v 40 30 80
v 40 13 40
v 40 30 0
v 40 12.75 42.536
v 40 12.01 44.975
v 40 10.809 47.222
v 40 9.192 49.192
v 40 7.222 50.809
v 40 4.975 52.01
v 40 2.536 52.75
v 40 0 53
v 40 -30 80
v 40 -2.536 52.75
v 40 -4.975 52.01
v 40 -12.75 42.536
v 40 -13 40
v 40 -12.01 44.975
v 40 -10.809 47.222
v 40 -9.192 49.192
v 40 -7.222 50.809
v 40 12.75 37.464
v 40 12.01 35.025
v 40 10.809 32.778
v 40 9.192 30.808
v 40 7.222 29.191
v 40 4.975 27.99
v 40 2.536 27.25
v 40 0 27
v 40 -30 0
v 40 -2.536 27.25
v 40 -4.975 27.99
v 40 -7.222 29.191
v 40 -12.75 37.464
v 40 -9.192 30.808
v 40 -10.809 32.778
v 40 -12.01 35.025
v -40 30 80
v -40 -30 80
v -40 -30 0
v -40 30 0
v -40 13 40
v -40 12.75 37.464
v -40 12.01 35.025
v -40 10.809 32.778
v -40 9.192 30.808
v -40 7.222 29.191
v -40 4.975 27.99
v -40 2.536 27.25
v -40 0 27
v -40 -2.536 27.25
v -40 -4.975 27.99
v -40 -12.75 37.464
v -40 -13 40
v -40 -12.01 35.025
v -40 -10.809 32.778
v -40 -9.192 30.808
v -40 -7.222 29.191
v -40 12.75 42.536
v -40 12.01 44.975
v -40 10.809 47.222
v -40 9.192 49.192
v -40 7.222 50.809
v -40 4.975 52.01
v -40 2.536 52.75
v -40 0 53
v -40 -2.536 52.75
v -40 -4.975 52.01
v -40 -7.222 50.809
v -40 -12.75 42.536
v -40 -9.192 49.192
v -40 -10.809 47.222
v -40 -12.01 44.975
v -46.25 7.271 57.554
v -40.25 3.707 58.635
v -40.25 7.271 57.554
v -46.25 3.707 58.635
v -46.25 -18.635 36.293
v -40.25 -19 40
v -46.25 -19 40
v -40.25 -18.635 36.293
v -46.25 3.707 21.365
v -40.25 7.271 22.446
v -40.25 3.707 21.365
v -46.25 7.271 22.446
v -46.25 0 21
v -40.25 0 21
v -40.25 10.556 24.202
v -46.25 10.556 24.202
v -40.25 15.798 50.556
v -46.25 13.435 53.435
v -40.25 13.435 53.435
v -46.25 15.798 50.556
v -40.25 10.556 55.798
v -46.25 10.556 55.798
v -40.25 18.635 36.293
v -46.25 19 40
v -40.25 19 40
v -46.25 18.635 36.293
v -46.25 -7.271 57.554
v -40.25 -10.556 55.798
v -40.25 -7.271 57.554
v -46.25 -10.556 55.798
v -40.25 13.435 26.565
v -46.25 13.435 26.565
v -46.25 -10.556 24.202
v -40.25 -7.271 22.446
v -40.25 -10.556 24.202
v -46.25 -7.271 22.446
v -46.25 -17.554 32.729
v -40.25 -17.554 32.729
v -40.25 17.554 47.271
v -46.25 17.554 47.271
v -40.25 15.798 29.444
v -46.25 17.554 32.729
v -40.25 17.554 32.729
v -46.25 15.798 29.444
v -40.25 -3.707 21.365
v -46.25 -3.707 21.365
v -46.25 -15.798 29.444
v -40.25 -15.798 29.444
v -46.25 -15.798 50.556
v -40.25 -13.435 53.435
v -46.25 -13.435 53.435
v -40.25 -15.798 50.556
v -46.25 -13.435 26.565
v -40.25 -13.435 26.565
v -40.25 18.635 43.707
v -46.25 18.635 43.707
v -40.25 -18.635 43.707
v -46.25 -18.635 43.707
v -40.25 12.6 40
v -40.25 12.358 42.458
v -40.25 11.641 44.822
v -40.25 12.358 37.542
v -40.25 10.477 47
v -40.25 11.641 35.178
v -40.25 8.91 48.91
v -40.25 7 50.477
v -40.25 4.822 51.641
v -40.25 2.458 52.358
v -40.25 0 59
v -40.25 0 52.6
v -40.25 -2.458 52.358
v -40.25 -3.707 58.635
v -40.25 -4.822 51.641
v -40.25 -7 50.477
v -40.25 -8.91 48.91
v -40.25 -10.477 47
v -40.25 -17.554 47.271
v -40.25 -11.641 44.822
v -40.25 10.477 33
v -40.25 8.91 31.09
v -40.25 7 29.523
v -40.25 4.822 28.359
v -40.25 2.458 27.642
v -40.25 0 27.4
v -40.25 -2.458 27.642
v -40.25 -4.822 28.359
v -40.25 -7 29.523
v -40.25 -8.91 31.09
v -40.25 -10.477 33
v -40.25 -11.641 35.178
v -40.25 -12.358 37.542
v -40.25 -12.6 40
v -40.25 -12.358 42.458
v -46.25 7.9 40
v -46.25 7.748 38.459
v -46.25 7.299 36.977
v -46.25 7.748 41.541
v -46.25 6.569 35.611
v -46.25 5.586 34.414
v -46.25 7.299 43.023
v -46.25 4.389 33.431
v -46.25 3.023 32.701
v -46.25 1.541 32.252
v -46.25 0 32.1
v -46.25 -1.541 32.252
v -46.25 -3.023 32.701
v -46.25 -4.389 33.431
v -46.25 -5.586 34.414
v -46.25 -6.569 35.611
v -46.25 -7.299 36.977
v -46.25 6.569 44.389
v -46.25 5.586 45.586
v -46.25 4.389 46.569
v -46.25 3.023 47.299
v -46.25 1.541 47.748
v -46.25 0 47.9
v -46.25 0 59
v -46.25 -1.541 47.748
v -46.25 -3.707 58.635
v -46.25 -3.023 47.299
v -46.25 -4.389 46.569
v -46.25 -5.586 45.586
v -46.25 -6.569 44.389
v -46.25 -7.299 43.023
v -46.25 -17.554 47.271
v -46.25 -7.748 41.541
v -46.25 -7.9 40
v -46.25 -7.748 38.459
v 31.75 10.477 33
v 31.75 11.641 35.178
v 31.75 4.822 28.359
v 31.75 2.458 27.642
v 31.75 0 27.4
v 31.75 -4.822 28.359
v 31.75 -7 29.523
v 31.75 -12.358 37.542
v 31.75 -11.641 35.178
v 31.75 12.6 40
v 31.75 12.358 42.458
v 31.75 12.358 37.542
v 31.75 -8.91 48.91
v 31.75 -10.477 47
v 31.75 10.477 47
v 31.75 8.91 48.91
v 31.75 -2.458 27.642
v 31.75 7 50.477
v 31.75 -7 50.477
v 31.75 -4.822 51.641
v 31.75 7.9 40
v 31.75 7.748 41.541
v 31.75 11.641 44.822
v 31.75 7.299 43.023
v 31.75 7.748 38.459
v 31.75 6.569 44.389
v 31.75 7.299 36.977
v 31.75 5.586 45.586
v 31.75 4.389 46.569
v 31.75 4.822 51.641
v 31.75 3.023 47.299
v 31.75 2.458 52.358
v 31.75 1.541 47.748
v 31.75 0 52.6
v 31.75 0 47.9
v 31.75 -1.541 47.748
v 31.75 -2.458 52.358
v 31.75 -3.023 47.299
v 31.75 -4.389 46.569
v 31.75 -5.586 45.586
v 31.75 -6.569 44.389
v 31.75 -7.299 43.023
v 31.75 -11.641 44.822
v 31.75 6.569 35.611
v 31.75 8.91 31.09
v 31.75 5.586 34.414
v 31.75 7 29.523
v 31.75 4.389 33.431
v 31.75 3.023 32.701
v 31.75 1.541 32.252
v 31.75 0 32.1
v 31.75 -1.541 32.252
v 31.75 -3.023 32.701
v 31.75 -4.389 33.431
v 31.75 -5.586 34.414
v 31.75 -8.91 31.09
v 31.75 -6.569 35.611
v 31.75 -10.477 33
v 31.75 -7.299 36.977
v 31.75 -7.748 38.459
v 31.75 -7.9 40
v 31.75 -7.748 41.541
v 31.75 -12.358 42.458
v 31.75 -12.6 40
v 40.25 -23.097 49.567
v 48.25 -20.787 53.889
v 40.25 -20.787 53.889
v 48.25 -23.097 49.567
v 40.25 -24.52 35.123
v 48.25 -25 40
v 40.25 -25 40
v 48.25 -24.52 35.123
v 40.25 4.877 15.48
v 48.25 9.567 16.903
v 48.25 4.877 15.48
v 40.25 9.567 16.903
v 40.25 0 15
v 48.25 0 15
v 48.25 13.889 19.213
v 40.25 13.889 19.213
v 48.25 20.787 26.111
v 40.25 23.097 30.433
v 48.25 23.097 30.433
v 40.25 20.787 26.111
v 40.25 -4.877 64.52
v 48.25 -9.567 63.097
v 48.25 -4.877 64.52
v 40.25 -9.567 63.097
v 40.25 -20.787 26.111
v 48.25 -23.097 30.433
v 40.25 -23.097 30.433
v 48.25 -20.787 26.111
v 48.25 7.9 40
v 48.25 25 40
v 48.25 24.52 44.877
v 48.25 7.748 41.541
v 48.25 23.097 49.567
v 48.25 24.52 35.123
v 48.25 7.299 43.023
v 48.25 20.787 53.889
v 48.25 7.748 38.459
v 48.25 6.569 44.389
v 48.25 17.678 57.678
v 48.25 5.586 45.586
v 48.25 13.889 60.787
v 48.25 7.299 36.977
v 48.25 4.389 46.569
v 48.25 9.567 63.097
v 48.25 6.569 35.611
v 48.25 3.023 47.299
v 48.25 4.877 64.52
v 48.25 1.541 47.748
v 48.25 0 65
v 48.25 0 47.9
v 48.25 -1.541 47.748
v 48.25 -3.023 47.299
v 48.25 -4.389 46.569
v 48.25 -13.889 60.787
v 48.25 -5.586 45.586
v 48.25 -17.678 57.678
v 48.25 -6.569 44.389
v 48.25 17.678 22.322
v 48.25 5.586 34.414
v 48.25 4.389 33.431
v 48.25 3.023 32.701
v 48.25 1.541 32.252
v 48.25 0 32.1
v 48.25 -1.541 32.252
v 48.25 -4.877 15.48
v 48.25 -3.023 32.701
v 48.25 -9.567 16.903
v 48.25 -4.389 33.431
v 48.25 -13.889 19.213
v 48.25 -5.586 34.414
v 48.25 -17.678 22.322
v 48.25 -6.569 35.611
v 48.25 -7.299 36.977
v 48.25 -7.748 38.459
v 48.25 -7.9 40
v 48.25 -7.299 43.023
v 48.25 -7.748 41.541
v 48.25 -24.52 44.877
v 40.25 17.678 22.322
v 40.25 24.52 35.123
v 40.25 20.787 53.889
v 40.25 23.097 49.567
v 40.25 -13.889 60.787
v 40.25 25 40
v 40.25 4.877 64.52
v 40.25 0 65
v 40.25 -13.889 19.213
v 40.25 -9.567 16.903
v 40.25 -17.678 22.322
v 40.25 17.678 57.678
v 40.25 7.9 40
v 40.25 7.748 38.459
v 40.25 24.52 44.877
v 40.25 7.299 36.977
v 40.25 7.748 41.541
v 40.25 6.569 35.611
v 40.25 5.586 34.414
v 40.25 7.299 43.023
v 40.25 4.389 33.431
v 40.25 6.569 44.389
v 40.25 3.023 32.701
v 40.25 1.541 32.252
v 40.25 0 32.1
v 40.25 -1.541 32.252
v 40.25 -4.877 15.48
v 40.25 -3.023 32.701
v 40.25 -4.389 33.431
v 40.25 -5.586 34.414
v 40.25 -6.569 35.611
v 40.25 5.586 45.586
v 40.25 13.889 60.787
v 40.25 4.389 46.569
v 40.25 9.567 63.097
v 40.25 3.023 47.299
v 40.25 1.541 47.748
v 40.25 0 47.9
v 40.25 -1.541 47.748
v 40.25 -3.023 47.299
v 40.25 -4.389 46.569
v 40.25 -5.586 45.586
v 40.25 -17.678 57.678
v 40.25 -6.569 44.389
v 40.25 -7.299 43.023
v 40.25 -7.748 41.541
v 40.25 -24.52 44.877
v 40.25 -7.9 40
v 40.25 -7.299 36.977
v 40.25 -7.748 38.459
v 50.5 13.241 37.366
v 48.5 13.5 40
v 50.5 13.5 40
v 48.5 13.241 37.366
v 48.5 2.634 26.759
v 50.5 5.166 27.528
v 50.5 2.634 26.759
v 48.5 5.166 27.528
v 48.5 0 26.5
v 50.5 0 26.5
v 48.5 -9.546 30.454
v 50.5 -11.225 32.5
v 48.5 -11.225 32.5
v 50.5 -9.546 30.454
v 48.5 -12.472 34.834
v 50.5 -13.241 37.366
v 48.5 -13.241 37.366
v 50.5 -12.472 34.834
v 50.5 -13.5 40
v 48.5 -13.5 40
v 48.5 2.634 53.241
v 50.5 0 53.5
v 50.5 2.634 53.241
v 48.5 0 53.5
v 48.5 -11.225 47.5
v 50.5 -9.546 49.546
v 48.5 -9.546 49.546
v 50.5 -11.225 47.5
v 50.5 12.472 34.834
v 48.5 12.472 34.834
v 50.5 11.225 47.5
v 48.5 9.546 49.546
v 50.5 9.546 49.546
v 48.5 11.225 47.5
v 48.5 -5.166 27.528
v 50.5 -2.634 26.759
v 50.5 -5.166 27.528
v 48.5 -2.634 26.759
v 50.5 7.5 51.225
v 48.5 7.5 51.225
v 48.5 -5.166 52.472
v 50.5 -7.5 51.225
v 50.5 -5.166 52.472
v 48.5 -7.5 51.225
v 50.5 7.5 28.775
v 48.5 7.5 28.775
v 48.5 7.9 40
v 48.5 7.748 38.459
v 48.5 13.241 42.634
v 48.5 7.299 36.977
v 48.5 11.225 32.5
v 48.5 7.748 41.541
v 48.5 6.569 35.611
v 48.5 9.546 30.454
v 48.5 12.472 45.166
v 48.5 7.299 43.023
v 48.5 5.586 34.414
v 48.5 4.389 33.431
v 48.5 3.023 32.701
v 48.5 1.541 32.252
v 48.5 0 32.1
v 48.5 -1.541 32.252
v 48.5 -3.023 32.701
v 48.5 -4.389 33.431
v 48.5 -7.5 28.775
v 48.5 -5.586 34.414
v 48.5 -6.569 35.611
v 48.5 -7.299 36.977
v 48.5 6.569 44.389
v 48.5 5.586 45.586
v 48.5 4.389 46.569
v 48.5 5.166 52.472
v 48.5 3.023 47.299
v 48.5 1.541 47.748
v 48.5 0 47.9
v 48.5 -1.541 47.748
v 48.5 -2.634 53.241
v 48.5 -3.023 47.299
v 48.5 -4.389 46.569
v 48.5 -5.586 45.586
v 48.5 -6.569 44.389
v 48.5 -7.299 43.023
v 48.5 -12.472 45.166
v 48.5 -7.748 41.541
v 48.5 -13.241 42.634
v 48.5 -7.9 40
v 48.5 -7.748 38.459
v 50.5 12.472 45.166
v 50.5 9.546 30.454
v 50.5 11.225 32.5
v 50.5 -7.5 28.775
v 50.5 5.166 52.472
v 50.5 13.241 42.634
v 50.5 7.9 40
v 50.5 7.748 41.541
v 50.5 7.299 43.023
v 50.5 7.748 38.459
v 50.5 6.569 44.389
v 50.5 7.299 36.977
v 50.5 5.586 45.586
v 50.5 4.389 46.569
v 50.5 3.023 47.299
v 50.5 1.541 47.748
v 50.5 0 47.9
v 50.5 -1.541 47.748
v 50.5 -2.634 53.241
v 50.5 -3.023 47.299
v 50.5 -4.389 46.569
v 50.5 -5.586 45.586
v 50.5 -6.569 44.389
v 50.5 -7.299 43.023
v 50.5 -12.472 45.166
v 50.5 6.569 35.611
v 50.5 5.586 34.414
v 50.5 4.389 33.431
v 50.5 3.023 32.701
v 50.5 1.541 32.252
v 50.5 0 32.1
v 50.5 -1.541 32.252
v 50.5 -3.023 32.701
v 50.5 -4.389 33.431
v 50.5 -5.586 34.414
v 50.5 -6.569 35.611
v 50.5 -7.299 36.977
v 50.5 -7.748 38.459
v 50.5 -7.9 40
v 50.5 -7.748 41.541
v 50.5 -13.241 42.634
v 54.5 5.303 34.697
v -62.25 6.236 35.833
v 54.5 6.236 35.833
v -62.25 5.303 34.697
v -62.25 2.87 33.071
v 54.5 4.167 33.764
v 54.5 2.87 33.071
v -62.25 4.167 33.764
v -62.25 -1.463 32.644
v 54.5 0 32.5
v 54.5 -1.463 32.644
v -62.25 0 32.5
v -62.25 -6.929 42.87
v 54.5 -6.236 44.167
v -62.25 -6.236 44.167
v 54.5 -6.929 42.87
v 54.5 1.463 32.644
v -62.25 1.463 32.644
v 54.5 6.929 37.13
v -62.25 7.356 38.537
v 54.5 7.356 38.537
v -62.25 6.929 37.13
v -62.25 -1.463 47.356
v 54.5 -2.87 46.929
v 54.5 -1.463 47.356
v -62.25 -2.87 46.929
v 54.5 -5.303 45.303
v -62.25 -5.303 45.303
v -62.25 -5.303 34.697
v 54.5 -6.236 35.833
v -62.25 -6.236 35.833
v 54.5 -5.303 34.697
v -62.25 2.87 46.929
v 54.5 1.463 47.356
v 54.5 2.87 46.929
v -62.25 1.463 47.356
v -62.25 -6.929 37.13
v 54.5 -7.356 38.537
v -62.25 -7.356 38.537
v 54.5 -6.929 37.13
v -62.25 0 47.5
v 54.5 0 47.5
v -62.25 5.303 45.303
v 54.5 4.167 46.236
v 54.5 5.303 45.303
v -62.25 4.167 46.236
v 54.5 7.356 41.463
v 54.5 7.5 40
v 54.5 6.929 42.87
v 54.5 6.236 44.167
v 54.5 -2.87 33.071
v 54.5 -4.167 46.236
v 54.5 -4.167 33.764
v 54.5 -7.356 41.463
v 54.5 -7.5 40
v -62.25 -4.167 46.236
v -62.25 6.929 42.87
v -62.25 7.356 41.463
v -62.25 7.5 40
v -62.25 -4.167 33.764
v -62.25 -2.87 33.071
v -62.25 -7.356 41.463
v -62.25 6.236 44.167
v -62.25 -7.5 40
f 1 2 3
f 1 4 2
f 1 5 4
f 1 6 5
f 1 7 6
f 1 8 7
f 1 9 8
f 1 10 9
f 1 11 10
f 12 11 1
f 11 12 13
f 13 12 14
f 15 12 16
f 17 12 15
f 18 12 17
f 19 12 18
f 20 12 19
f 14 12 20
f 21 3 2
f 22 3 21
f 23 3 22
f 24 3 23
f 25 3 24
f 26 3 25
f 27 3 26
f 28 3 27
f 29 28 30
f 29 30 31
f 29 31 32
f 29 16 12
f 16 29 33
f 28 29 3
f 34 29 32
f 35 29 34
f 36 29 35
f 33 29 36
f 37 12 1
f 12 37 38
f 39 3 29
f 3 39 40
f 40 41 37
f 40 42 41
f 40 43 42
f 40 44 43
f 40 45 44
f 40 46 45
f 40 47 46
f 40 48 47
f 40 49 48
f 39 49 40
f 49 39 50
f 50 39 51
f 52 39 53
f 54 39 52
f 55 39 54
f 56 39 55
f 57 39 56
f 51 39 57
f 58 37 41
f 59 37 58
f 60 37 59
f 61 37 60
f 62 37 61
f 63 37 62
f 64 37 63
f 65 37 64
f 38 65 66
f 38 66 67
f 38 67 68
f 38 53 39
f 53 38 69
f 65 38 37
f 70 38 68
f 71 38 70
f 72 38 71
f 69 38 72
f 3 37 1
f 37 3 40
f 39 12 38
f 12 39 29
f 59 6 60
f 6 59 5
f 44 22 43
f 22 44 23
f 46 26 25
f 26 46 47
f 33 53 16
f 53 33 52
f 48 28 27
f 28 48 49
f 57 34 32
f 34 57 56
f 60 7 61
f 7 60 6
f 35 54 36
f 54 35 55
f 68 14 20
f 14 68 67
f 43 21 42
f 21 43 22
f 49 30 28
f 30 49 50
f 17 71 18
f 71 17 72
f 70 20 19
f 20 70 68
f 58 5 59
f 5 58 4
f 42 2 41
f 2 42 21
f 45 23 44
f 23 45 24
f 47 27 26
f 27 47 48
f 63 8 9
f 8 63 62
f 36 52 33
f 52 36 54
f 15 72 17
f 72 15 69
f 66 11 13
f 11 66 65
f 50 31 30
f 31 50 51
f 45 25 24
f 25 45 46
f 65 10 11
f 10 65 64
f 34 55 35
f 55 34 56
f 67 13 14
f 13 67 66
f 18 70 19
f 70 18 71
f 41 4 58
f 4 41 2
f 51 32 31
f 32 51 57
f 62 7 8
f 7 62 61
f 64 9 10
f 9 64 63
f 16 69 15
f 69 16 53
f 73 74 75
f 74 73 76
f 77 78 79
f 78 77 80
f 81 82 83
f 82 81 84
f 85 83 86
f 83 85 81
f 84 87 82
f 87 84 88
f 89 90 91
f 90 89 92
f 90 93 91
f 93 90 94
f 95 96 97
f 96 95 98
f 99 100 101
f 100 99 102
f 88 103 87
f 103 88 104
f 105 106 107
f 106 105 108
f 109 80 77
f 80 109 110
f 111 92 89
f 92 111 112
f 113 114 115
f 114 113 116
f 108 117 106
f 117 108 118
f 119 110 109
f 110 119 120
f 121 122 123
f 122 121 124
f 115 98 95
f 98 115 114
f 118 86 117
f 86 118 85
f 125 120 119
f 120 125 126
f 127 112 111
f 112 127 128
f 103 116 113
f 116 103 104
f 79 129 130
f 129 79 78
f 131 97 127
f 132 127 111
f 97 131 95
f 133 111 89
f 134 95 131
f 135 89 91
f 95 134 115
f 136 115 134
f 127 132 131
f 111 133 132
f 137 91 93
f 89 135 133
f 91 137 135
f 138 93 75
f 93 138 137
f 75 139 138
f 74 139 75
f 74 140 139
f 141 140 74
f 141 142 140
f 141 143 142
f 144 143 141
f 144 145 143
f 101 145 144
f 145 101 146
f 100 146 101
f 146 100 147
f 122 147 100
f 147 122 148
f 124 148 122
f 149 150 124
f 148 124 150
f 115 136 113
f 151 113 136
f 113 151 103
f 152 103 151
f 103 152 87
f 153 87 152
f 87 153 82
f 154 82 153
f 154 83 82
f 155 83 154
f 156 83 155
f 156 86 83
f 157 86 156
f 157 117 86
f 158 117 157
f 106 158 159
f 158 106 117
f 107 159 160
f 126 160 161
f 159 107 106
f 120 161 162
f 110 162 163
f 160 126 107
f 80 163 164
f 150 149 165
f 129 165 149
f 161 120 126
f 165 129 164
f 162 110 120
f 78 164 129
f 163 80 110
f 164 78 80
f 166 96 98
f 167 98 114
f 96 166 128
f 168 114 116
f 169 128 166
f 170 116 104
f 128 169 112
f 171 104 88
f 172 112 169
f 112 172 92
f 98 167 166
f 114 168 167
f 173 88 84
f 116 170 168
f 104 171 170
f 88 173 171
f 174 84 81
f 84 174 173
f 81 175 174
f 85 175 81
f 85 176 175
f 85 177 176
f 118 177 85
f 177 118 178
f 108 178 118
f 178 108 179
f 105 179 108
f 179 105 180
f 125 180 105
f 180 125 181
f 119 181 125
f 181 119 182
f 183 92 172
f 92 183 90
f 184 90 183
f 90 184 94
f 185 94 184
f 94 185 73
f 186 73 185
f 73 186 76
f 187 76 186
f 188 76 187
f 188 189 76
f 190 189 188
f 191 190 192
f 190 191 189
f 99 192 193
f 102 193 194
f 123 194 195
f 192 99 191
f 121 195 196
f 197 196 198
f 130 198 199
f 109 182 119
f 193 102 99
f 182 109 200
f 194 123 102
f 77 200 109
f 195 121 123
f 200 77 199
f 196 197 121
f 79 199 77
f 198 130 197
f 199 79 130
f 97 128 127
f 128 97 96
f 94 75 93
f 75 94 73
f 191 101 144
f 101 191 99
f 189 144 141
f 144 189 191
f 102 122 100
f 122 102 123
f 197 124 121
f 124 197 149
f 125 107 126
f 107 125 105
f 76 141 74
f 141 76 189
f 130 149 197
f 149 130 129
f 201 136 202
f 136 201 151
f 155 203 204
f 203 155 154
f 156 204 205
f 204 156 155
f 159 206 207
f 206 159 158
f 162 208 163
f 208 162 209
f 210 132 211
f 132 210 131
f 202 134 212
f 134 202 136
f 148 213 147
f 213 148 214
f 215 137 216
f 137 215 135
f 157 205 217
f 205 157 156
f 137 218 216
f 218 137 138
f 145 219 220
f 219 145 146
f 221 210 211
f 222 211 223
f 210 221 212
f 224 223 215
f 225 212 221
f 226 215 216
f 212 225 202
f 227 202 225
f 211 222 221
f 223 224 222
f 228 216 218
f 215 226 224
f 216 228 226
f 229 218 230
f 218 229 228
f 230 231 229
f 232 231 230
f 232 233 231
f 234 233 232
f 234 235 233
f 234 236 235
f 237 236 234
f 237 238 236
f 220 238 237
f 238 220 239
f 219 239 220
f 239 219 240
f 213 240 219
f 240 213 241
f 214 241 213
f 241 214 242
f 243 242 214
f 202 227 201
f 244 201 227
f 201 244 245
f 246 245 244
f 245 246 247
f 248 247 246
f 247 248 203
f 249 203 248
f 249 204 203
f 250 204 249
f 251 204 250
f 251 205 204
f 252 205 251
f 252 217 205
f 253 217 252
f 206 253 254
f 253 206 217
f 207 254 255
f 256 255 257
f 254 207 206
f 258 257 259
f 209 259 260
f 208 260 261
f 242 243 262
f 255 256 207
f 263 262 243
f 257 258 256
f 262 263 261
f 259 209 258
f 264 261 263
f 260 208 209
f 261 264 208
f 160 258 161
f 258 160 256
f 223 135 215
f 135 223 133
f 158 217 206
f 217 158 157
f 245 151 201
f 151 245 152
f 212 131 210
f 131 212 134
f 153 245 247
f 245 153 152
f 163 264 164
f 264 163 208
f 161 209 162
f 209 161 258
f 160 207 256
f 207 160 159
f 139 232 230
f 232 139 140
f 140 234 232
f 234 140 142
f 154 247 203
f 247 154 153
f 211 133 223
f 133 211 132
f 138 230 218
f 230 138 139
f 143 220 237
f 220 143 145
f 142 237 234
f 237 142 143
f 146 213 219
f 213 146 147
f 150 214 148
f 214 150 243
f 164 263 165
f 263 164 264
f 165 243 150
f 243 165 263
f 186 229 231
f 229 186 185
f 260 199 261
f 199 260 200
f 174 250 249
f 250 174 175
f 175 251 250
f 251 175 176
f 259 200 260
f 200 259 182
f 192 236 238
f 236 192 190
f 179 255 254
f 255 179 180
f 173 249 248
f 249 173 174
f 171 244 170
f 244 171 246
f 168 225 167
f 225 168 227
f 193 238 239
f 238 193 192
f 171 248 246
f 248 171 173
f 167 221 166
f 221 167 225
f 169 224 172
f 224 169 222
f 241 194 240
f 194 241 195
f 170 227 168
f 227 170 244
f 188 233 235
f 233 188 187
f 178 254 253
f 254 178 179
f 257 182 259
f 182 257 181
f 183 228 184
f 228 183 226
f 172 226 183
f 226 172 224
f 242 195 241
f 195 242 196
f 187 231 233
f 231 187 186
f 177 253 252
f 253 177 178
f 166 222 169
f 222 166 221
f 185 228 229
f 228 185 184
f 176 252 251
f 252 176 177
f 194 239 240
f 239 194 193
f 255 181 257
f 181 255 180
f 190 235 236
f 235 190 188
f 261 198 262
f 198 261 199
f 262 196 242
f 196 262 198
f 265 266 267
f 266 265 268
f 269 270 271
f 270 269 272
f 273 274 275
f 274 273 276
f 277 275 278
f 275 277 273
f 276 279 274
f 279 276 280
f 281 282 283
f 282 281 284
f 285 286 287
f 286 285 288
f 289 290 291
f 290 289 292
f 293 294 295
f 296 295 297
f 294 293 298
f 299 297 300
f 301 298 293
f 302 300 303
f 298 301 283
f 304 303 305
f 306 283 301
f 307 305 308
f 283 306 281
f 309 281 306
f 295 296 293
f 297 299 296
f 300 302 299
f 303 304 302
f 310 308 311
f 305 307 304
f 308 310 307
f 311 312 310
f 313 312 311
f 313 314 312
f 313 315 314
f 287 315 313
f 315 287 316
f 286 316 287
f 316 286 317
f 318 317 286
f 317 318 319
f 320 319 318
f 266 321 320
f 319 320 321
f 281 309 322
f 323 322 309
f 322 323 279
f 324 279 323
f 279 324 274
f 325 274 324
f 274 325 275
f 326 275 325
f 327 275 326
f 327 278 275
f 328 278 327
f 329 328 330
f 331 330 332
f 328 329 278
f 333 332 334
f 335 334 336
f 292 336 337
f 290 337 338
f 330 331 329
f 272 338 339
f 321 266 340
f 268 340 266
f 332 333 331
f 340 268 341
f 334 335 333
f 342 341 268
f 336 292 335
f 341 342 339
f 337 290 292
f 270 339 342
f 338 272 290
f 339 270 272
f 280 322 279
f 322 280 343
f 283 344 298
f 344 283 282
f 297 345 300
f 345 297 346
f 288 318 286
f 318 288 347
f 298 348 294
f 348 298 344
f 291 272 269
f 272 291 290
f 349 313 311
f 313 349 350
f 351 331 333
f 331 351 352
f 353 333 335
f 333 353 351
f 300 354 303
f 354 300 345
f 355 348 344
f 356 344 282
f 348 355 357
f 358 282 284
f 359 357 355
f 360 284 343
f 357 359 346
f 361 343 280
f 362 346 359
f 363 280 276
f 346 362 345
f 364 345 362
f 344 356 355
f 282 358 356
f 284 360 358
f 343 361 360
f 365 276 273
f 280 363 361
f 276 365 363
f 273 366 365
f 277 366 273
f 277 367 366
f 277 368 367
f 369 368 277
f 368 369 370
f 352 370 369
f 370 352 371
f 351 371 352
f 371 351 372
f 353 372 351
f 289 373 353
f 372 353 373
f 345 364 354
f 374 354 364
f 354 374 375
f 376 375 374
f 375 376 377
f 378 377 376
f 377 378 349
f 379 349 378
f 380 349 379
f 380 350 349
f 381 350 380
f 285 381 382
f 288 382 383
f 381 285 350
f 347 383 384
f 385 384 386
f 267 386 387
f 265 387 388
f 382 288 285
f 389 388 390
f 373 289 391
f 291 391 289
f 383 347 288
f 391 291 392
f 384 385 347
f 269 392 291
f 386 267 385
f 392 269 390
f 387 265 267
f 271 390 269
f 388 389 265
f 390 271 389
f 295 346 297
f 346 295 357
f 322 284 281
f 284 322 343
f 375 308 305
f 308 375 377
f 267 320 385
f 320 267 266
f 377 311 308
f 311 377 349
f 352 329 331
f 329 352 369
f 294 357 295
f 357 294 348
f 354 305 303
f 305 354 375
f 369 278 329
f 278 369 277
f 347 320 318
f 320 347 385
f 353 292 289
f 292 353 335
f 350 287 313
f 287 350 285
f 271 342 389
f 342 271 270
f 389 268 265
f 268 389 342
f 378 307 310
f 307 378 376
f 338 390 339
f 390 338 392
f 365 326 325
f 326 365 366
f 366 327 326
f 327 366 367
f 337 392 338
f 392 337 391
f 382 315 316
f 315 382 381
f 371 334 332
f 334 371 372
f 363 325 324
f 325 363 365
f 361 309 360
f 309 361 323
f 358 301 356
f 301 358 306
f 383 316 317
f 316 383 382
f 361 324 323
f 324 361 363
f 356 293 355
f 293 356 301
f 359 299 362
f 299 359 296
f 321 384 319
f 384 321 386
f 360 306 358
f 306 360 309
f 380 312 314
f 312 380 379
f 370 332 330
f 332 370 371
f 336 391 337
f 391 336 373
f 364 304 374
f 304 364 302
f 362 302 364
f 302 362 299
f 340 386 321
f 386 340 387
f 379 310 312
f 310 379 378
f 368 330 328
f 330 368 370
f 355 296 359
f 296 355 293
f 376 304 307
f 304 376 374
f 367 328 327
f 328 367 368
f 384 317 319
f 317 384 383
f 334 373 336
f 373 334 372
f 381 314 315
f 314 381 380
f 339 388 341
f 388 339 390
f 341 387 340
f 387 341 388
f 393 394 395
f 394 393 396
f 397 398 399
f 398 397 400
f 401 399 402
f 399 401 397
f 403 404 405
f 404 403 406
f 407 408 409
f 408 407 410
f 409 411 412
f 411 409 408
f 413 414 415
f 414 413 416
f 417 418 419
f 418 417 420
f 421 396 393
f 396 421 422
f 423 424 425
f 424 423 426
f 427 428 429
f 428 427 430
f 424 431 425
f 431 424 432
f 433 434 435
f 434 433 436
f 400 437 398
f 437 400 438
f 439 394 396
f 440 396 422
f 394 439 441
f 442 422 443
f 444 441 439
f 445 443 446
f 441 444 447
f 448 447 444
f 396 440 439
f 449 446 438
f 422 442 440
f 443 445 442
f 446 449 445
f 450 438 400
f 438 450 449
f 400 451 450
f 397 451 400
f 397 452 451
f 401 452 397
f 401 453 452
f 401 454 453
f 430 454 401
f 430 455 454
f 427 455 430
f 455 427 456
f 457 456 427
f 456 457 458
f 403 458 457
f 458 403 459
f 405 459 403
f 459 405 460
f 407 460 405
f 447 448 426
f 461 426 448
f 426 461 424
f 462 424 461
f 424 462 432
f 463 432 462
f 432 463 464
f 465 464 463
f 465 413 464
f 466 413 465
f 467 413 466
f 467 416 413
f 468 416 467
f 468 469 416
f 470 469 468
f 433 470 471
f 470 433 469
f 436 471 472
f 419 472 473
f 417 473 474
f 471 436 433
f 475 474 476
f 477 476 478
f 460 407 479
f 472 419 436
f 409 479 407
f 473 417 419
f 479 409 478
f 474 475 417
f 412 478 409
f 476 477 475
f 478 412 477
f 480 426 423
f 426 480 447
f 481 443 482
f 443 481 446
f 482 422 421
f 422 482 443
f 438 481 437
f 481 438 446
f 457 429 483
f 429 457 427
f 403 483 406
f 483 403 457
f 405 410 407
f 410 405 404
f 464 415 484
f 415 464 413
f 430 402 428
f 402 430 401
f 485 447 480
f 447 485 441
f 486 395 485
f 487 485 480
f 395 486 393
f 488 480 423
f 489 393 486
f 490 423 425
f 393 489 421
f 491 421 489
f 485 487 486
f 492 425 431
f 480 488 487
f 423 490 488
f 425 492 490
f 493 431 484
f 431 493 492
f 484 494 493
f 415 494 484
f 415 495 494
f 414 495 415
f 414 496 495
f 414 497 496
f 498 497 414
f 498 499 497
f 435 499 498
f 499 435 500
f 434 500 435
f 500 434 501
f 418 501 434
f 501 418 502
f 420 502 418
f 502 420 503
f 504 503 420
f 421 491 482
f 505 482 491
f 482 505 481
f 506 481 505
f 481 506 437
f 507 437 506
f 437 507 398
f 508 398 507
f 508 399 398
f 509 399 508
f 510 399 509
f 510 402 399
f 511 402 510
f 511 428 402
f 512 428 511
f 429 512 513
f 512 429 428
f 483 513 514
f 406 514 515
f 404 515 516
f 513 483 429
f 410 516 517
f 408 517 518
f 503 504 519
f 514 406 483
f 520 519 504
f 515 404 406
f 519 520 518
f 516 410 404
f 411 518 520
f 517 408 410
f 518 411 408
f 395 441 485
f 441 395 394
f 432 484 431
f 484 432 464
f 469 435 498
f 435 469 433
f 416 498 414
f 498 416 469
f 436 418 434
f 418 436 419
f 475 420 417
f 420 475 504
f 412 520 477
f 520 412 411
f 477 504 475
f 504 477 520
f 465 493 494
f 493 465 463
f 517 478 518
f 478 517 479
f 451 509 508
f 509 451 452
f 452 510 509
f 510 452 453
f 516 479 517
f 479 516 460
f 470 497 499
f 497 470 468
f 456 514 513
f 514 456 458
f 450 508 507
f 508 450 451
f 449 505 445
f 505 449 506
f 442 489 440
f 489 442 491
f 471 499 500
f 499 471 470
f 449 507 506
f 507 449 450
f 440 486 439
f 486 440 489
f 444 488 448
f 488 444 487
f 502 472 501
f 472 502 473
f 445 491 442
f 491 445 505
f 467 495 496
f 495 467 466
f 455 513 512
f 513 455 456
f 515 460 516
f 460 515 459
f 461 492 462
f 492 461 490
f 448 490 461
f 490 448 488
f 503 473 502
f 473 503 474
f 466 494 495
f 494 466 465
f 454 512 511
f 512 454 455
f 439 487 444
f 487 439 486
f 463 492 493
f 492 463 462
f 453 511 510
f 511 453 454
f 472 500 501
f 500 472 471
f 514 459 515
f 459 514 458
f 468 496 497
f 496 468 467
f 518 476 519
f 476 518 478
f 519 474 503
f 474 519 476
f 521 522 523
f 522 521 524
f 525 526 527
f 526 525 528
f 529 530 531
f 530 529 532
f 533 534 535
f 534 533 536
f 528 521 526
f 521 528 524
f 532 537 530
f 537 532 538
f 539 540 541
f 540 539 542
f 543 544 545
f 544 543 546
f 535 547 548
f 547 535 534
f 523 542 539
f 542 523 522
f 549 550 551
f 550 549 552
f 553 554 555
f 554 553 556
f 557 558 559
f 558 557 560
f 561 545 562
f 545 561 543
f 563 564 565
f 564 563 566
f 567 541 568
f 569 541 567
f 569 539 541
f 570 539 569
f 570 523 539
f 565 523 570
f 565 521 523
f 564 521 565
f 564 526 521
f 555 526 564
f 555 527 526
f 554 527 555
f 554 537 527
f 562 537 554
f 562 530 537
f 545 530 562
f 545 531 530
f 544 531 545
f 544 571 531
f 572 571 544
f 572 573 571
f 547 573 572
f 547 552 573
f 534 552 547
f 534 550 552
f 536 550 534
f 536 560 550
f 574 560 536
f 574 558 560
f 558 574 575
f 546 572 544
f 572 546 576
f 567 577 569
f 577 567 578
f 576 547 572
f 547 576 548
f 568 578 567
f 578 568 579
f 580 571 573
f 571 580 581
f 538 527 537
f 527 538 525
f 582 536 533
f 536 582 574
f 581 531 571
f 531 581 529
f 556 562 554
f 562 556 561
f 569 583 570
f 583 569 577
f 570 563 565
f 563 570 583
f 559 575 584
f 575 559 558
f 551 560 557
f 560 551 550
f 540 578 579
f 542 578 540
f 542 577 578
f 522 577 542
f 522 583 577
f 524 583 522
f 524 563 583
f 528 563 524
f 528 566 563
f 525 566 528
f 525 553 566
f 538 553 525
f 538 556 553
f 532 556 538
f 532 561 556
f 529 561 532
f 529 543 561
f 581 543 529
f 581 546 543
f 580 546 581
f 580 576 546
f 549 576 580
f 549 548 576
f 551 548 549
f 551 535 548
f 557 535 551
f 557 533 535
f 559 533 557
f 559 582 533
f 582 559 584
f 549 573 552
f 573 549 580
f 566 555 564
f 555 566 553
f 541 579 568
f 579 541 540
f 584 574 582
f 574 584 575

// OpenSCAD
$fn = 32;

// ------------------------------------------------------------------------
// Bushed housing: 80 x 60 x 80 mm housing, bushing d25.2
// Every part is its own module, assembly() places them once.
// ------------------------------------------------------------------------

// --- part 1 ---
module housing() {
  difference() {
    translate([-40, -30, 0]) cube([80, 60, 80]);
    translate([0, 0, 40]) rotate([0, 90, 0]) cylinder(h = 82, d = 26, center = true);
  }
}

// --- part 2 ---
module bushing() {
  difference() {
    union() {
      cylinder(h = 6, d = 38);
      translate([0, 0, 6]) cylinder(h = 72, d = 25.2);
    }
    translate([0, 0, -1]) cylinder(h = 80, d = 15.8);
  }
}

// --- part 3 ---
module shaft() {
  translate([0, 0, -58.375]) cylinder(h = 116.75, d = 15);
}

// --- part 4 ---
module cover() {
  difference() {
    cylinder(h = 8, d = 50);
    translate([0, 0, -1]) cylinder(h = 10, d = 15.8);
  }
}

// --- part 5 ---
module washer() {
  difference() {
      translate([0, 0, 0]) cylinder(h = 2, d = 27);
      translate([0, 0, -1]) cylinder(h = 4, d = 15.8);
    }
}

// --- assembly ---
module assembly() {
  translate([0, 0, 0]) rotate([0, 0, 0]) housing();
  translate([-46.25, 0, 40]) rotate([0, 90, 0]) bushing();
  translate([-3.875, 0, 40]) rotate([0, 90, 0]) shaft();
  translate([40.25, 0, 40]) rotate([0, 90, 0]) cover();
  translate([48.5, 0, 40]) rotate([0, 90, 0]) washer();
}

assembly();
